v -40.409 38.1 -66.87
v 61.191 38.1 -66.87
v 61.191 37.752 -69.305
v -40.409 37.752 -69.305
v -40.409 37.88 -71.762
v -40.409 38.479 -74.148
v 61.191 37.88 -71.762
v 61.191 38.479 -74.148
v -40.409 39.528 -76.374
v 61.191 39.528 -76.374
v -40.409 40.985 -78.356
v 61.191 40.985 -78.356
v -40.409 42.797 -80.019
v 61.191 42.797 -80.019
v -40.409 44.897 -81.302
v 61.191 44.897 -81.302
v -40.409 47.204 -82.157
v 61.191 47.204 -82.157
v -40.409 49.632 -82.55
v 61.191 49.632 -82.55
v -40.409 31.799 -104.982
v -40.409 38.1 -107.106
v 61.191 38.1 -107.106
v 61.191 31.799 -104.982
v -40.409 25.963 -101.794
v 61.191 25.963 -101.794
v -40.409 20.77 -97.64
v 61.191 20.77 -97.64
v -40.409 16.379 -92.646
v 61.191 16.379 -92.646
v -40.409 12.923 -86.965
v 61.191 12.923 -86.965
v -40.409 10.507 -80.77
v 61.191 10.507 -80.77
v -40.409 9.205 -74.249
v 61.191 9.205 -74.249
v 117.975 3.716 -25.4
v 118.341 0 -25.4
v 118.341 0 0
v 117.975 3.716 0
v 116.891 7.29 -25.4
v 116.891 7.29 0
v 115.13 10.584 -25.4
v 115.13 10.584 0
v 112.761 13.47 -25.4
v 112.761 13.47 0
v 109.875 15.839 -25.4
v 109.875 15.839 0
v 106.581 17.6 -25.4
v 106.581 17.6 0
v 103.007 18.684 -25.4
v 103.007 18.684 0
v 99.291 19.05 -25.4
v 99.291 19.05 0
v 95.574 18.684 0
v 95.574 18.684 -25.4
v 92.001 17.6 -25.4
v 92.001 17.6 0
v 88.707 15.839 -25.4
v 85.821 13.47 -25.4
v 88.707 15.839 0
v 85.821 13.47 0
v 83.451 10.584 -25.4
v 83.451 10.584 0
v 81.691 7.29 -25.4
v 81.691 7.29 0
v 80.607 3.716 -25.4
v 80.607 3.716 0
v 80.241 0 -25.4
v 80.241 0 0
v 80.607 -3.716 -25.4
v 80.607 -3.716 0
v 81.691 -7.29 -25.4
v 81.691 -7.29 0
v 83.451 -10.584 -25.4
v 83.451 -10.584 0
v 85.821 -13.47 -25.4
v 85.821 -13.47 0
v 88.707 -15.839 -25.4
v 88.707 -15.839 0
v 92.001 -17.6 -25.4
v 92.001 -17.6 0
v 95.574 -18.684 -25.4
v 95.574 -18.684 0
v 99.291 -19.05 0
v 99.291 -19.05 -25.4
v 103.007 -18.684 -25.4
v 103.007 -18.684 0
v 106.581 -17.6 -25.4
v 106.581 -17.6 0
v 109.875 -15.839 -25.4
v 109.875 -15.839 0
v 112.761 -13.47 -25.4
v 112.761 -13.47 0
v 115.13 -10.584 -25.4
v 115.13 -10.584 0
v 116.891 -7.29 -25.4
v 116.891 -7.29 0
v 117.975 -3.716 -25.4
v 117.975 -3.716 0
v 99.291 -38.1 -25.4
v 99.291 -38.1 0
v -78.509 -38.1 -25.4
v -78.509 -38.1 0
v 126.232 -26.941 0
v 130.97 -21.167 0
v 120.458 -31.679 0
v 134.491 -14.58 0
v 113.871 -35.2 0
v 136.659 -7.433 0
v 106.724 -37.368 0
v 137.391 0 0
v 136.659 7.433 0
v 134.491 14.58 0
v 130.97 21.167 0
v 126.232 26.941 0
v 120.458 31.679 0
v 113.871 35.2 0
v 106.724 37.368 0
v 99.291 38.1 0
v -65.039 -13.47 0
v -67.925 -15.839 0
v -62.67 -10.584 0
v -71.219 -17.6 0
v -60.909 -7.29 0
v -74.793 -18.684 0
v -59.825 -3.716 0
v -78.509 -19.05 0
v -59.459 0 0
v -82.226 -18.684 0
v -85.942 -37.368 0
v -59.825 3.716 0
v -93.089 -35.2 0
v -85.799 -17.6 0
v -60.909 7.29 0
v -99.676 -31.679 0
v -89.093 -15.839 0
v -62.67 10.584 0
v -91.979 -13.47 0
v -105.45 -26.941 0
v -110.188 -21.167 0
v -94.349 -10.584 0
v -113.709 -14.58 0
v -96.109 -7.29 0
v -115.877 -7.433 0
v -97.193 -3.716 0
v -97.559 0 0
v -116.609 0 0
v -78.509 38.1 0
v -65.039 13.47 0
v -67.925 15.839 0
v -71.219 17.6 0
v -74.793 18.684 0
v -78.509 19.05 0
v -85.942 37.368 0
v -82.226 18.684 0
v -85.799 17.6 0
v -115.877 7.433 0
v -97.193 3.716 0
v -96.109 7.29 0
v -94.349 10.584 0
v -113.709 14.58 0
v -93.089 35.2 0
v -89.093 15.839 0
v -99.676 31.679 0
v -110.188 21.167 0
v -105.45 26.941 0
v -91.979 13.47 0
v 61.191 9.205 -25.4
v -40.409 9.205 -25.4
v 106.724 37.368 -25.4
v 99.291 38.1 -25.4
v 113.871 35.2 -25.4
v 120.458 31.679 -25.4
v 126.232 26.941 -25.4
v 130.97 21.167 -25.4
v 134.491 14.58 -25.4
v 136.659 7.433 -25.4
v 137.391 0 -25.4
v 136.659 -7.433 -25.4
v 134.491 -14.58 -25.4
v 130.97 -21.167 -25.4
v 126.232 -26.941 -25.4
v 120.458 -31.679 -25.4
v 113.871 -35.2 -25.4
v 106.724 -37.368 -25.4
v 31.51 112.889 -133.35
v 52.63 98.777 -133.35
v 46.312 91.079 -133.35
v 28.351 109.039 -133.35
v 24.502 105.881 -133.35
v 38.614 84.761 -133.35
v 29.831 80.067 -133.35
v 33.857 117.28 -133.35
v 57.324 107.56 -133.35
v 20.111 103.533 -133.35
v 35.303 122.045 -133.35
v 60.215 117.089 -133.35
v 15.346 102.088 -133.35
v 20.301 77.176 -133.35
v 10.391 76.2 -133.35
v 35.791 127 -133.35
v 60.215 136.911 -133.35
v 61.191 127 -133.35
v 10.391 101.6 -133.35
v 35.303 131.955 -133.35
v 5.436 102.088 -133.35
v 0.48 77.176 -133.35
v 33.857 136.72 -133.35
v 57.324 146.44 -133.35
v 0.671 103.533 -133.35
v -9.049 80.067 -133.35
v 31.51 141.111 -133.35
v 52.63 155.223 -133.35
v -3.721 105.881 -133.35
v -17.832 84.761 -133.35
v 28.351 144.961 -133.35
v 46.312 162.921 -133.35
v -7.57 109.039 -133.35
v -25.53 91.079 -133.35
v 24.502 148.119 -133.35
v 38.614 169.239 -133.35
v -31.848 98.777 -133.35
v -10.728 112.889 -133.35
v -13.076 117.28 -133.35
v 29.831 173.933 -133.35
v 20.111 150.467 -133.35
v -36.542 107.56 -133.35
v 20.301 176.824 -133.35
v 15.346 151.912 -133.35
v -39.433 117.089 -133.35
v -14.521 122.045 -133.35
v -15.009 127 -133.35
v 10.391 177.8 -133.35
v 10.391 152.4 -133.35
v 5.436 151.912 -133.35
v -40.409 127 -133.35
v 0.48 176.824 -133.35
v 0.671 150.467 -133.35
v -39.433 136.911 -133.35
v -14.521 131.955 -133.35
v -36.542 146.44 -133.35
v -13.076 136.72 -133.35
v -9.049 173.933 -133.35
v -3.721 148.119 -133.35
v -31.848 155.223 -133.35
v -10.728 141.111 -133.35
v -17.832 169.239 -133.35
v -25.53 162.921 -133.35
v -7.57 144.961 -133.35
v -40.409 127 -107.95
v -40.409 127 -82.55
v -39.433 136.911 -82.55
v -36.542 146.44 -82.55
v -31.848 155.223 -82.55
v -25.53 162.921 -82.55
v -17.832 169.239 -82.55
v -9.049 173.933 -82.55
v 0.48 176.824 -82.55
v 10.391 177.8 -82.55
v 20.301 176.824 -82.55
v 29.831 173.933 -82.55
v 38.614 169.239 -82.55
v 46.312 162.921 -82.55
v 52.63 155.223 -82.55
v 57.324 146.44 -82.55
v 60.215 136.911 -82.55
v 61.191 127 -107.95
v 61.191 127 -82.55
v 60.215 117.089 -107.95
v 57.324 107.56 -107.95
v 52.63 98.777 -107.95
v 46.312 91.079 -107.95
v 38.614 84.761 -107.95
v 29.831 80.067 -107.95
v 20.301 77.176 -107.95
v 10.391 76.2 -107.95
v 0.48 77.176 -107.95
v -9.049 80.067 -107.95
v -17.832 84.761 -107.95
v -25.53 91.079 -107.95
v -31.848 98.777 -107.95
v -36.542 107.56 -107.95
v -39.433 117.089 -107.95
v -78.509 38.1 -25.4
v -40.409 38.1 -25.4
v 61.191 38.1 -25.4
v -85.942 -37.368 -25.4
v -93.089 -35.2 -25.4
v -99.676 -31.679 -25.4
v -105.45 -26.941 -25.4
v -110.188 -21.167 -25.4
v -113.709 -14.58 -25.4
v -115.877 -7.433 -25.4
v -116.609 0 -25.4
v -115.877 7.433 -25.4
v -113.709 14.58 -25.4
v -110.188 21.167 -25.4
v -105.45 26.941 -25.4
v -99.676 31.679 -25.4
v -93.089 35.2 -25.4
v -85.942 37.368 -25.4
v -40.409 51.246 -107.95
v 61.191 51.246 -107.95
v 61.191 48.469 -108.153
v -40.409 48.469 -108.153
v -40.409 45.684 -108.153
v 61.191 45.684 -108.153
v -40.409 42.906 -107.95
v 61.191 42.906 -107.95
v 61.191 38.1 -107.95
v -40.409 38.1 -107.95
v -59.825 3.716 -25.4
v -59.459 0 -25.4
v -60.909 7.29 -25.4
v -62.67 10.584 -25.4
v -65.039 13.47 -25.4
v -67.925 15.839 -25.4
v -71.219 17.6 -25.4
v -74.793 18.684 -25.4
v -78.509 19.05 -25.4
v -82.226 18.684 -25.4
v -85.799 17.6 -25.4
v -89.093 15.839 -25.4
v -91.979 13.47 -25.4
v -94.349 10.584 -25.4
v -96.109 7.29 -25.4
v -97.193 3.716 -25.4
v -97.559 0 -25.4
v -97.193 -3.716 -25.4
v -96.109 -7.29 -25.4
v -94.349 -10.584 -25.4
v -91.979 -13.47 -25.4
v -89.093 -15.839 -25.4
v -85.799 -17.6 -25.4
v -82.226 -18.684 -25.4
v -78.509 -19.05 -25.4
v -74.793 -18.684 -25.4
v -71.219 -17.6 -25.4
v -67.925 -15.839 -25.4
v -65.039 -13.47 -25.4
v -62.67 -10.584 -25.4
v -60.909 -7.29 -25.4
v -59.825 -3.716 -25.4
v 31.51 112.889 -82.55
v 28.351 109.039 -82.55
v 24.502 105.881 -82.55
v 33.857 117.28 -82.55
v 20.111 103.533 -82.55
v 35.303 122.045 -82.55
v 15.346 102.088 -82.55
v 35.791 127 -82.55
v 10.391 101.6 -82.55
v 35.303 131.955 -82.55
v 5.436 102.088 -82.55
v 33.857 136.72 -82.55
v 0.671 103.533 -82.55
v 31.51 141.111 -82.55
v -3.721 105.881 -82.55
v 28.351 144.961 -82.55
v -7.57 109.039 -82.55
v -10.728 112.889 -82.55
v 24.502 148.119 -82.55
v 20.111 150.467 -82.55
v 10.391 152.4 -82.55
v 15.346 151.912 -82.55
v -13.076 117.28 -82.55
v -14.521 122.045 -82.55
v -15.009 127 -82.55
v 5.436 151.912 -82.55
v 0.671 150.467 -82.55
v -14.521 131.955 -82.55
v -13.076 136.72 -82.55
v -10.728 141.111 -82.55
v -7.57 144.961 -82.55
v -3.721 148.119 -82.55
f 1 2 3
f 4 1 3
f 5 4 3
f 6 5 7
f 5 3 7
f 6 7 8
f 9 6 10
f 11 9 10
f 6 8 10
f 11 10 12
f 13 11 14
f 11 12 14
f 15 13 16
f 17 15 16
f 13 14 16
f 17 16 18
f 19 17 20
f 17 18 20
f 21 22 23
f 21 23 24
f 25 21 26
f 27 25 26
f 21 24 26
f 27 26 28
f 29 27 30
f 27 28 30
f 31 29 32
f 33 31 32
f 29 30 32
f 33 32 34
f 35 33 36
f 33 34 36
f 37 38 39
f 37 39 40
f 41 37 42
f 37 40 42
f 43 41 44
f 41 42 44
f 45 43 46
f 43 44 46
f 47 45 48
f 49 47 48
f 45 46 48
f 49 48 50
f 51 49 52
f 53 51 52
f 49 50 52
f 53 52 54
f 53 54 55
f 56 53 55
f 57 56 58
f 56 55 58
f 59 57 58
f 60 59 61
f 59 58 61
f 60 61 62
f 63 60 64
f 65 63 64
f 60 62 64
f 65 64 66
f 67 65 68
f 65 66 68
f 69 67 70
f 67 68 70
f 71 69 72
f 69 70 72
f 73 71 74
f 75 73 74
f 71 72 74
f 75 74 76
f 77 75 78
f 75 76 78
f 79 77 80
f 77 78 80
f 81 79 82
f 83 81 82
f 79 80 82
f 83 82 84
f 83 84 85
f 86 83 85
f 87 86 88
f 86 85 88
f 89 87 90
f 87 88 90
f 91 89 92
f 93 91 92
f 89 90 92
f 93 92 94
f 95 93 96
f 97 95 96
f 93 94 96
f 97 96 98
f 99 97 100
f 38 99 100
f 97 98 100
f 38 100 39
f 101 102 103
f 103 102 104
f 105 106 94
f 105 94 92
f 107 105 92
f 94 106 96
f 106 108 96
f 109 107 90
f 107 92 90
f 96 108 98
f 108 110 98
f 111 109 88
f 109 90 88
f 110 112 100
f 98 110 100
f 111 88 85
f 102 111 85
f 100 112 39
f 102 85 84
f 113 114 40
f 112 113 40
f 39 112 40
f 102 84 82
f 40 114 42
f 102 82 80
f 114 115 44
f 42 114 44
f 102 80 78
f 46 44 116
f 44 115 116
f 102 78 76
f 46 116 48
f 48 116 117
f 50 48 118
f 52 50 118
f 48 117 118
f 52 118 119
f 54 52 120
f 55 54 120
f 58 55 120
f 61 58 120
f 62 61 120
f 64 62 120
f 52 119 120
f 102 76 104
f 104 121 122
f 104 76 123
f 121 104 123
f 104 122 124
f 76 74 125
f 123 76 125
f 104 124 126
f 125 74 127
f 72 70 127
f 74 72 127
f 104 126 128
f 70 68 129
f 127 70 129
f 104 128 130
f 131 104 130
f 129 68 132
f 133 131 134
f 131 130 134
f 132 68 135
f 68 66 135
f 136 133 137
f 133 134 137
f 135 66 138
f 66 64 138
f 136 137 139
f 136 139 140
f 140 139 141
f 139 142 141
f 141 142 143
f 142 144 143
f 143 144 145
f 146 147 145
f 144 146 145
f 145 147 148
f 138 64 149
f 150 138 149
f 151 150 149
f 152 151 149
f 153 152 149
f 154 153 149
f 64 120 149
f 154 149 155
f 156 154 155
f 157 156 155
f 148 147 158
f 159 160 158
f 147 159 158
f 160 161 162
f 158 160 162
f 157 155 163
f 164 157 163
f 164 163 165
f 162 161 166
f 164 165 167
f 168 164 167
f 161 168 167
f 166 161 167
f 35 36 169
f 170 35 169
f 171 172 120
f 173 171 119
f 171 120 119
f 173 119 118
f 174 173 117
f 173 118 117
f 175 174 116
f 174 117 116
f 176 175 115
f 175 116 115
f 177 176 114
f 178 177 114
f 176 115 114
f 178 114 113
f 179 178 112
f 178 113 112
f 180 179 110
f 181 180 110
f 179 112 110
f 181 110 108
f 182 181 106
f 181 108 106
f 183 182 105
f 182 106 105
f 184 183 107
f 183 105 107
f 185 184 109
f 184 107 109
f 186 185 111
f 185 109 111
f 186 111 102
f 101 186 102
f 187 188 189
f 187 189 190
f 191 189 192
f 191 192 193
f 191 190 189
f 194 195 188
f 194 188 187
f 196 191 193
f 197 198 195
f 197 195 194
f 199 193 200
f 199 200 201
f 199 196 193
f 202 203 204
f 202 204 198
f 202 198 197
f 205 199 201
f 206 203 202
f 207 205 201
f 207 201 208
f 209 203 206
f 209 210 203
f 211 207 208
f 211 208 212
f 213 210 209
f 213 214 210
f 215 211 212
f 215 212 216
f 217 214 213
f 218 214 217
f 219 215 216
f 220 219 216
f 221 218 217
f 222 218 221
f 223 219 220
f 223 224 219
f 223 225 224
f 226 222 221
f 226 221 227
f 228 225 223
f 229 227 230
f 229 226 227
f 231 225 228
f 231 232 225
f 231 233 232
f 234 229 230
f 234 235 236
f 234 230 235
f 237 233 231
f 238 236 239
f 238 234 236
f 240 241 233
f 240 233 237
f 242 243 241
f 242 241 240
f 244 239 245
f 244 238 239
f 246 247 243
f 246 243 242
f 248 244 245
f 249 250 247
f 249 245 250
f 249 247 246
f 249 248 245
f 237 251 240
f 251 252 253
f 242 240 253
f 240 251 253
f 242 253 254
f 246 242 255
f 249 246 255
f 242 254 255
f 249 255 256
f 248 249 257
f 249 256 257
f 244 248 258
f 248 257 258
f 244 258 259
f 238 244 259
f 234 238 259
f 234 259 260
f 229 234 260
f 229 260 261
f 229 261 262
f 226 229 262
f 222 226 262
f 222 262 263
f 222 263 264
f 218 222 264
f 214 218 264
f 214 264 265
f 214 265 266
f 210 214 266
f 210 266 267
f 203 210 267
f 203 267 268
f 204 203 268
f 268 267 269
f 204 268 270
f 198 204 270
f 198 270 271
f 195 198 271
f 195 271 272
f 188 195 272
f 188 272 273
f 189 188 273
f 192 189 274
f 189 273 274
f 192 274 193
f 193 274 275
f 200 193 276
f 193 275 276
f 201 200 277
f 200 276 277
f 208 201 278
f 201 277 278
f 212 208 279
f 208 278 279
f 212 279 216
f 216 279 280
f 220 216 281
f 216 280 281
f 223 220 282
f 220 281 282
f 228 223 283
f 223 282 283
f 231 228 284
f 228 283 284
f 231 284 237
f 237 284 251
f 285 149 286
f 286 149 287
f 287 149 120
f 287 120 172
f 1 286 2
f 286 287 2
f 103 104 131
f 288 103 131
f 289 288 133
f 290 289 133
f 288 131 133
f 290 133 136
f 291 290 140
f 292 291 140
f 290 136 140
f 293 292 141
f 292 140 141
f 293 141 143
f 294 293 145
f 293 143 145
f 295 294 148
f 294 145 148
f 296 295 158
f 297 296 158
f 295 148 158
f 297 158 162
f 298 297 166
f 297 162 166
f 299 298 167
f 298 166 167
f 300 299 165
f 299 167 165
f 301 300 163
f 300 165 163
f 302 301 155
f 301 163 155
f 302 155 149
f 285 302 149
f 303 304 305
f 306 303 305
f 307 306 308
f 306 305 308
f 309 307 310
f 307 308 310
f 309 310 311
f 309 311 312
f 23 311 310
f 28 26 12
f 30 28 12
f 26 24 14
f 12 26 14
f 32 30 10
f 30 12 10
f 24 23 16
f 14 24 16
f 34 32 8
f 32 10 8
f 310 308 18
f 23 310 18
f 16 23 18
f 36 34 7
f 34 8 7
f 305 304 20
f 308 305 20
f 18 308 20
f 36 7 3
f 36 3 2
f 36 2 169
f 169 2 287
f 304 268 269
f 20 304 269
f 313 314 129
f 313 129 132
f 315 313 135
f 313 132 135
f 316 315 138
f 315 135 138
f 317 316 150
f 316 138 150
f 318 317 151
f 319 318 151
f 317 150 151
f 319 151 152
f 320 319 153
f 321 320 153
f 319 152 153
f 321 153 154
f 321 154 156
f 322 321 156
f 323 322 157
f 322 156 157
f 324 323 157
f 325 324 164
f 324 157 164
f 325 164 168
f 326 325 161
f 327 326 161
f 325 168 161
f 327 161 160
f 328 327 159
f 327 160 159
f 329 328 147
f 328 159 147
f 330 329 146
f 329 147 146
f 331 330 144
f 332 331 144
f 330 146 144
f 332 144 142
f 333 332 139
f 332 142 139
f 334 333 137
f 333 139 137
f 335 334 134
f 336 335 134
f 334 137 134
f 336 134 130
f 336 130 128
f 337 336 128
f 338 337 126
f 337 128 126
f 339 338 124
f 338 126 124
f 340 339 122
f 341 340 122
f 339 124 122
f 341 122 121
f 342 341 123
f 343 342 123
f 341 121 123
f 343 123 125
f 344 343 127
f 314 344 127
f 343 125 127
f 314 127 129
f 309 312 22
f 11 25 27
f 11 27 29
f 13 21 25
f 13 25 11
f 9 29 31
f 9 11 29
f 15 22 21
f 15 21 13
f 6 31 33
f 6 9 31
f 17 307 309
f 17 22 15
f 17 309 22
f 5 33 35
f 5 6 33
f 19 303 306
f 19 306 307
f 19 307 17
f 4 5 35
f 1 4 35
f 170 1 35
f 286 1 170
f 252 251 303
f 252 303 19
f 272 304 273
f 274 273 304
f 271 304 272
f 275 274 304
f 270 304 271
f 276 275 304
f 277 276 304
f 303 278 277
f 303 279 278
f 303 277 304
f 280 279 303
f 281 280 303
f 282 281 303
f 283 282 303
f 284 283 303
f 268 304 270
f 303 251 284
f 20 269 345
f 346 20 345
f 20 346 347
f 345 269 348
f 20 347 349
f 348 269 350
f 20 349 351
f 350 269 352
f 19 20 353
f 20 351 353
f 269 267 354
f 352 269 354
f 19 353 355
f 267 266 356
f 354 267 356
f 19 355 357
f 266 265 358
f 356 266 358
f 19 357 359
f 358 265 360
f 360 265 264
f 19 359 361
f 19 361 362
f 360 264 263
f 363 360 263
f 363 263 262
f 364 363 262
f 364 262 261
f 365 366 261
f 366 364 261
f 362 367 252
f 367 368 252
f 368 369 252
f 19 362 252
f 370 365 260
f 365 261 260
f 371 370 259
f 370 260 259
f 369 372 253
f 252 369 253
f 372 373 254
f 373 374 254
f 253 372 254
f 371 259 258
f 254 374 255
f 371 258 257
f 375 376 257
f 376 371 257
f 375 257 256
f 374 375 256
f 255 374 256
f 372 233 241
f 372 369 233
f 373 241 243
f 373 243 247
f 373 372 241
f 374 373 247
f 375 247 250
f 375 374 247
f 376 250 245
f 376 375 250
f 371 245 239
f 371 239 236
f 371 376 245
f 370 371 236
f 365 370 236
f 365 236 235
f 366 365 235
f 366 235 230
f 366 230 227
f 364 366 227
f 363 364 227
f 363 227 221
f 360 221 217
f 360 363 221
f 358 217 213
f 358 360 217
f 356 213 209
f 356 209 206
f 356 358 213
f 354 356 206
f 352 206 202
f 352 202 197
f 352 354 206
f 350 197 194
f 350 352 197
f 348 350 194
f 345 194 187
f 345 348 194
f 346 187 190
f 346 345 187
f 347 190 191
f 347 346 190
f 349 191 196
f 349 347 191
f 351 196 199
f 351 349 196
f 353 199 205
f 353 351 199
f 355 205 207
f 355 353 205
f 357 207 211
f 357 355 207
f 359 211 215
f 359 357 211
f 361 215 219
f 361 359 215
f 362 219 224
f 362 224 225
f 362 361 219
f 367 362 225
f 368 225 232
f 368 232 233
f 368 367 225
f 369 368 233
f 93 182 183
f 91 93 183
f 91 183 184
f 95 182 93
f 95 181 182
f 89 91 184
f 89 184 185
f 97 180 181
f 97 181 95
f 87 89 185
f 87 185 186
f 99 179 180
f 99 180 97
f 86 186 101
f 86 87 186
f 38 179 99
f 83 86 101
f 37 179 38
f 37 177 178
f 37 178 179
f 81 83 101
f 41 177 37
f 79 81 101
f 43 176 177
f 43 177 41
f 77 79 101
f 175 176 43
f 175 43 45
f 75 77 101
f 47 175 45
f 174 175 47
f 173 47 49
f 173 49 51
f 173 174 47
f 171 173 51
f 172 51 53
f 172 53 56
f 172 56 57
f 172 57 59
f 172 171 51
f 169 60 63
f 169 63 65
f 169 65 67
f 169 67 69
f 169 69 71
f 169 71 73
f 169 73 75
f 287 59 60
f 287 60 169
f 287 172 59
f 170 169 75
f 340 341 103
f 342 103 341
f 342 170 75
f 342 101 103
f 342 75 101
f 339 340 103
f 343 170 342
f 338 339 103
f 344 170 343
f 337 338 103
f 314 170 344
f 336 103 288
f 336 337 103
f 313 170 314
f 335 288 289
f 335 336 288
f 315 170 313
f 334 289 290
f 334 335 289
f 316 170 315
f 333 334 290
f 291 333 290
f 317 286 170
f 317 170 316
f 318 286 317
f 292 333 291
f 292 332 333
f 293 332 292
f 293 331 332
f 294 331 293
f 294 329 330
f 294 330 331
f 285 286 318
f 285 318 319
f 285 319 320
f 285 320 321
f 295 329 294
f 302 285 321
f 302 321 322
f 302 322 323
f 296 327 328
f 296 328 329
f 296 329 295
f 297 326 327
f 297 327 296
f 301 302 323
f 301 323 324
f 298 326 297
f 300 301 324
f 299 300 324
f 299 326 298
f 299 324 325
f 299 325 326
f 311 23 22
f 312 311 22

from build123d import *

# Parameters (mm, degrees)
SKETCH1_R           = 19.05
BOSS_EXTRUDE1_DEPTH = 25.4
SKETCH3_R           = 25.4
BOSS_EXTRUDE2_DEPTH = 25.4
SKETCH4_R           = 50.8
SKETCH4_R_2         = 25.4
BOSS_EXTRUDE3_DEPTH = 25.4
BOSS_EXTRUDE4_DEPTH = 101.6


with BuildPart() as part:
    # Sketch1 → Boss-Extrude1 (new body)
    with BuildSketch(Plane.XY):
        with BuildLine():
            Line((-78.509090909, 38.1), (99.290909091, 38.1))
            ThreePointArc((99.290909091, 38.1), (137.390909091, 0), (99.290909091, -38.1))
            Line((99.290909091, -38.1), (-78.509090909, -38.1))
            ThreePointArc((-78.509090909, -38.1), (-116.609090909, 0), (-78.509090909, 38.1))
        make_face()
        with Locations((-78.509090909, 0)):
            Circle(SKETCH1_R, mode=Mode.SUBTRACT)
        with Locations((99.290909091, 0)):
            Circle(SKETCH1_R, mode=Mode.SUBTRACT)
    extrude(amount=-BOSS_EXTRUDE1_DEPTH)



with BuildPart() as body_2:
    # Sketch3 → Boss-Extrude2 (new body)
    with BuildSketch(Plane(origin=(0, 0, -82.55), x_dir=(-1, 0, 0), z_dir=(0, 0, -1))):
        with BuildLine():
            Line((-61.190909091, 127), (-61.190909091, 38.1))
            Line((-61.190909091, 38.1), (40.409090909, 38.1))
            Line((40.409090909, 38.1), (40.409090909, 127))
            ThreePointArc((40.409090909, 127), (-10.390909091, 177.8), (-61.190909091, 127))
        make_face()
        with Locations((-10.390909091, 127)):
            Circle(SKETCH3_R, mode=Mode.SUBTRACT)
    extrude(amount=BOSS_EXTRUDE2_DEPTH)

    # Sketch4 → Boss-Extrude3 (add)
    with BuildSketch(Plane(origin=(0, 0, -107.95), x_dir=(-1, 0, 0), z_dir=(0, 0, -1))):
        with Locations((-10.390909091, 127)):
            Circle(SKETCH4_R)
        with Locations((-10.390909091, 127)):
            Circle(SKETCH4_R_2, mode=Mode.SUBTRACT)
    extrude(amount=BOSS_EXTRUDE3_DEPTH)


with BuildPart() as part_1:
    add(part.part)

    add(body_2.part)  # Boss-Extrude4 merges body 2
    # Sketch6 → Boss-Extrude4 (add)
    with BuildSketch(Plane(origin=(61.190909091, 0, 0), x_dir=(0, 0, -1), z_dir=(1, 0, 0))):
        with BuildLine():
            Line((25.4, 38.1), (66.869857518, 38.1))
            ThreePointArc((66.869857518, 38.1), (78.035050252, 40.707035383), (82.55, 51.246171546))
            Line((82.55, 51.246171546), (107.95, 51.246171546))
            ThreePointArc((107.95, 51.246171546), (99.806428385, 23.245891332), (74.248865658, 9.205078029))
            Line((74.248865658, 9.205078029), (25.4, 9.205078029))
            Line((25.4, 9.205078029), (25.4, 38.1))
        make_face()
    extrude(amount=-BOSS_EXTRUDE4_DEPTH)


solid = part_1.part
